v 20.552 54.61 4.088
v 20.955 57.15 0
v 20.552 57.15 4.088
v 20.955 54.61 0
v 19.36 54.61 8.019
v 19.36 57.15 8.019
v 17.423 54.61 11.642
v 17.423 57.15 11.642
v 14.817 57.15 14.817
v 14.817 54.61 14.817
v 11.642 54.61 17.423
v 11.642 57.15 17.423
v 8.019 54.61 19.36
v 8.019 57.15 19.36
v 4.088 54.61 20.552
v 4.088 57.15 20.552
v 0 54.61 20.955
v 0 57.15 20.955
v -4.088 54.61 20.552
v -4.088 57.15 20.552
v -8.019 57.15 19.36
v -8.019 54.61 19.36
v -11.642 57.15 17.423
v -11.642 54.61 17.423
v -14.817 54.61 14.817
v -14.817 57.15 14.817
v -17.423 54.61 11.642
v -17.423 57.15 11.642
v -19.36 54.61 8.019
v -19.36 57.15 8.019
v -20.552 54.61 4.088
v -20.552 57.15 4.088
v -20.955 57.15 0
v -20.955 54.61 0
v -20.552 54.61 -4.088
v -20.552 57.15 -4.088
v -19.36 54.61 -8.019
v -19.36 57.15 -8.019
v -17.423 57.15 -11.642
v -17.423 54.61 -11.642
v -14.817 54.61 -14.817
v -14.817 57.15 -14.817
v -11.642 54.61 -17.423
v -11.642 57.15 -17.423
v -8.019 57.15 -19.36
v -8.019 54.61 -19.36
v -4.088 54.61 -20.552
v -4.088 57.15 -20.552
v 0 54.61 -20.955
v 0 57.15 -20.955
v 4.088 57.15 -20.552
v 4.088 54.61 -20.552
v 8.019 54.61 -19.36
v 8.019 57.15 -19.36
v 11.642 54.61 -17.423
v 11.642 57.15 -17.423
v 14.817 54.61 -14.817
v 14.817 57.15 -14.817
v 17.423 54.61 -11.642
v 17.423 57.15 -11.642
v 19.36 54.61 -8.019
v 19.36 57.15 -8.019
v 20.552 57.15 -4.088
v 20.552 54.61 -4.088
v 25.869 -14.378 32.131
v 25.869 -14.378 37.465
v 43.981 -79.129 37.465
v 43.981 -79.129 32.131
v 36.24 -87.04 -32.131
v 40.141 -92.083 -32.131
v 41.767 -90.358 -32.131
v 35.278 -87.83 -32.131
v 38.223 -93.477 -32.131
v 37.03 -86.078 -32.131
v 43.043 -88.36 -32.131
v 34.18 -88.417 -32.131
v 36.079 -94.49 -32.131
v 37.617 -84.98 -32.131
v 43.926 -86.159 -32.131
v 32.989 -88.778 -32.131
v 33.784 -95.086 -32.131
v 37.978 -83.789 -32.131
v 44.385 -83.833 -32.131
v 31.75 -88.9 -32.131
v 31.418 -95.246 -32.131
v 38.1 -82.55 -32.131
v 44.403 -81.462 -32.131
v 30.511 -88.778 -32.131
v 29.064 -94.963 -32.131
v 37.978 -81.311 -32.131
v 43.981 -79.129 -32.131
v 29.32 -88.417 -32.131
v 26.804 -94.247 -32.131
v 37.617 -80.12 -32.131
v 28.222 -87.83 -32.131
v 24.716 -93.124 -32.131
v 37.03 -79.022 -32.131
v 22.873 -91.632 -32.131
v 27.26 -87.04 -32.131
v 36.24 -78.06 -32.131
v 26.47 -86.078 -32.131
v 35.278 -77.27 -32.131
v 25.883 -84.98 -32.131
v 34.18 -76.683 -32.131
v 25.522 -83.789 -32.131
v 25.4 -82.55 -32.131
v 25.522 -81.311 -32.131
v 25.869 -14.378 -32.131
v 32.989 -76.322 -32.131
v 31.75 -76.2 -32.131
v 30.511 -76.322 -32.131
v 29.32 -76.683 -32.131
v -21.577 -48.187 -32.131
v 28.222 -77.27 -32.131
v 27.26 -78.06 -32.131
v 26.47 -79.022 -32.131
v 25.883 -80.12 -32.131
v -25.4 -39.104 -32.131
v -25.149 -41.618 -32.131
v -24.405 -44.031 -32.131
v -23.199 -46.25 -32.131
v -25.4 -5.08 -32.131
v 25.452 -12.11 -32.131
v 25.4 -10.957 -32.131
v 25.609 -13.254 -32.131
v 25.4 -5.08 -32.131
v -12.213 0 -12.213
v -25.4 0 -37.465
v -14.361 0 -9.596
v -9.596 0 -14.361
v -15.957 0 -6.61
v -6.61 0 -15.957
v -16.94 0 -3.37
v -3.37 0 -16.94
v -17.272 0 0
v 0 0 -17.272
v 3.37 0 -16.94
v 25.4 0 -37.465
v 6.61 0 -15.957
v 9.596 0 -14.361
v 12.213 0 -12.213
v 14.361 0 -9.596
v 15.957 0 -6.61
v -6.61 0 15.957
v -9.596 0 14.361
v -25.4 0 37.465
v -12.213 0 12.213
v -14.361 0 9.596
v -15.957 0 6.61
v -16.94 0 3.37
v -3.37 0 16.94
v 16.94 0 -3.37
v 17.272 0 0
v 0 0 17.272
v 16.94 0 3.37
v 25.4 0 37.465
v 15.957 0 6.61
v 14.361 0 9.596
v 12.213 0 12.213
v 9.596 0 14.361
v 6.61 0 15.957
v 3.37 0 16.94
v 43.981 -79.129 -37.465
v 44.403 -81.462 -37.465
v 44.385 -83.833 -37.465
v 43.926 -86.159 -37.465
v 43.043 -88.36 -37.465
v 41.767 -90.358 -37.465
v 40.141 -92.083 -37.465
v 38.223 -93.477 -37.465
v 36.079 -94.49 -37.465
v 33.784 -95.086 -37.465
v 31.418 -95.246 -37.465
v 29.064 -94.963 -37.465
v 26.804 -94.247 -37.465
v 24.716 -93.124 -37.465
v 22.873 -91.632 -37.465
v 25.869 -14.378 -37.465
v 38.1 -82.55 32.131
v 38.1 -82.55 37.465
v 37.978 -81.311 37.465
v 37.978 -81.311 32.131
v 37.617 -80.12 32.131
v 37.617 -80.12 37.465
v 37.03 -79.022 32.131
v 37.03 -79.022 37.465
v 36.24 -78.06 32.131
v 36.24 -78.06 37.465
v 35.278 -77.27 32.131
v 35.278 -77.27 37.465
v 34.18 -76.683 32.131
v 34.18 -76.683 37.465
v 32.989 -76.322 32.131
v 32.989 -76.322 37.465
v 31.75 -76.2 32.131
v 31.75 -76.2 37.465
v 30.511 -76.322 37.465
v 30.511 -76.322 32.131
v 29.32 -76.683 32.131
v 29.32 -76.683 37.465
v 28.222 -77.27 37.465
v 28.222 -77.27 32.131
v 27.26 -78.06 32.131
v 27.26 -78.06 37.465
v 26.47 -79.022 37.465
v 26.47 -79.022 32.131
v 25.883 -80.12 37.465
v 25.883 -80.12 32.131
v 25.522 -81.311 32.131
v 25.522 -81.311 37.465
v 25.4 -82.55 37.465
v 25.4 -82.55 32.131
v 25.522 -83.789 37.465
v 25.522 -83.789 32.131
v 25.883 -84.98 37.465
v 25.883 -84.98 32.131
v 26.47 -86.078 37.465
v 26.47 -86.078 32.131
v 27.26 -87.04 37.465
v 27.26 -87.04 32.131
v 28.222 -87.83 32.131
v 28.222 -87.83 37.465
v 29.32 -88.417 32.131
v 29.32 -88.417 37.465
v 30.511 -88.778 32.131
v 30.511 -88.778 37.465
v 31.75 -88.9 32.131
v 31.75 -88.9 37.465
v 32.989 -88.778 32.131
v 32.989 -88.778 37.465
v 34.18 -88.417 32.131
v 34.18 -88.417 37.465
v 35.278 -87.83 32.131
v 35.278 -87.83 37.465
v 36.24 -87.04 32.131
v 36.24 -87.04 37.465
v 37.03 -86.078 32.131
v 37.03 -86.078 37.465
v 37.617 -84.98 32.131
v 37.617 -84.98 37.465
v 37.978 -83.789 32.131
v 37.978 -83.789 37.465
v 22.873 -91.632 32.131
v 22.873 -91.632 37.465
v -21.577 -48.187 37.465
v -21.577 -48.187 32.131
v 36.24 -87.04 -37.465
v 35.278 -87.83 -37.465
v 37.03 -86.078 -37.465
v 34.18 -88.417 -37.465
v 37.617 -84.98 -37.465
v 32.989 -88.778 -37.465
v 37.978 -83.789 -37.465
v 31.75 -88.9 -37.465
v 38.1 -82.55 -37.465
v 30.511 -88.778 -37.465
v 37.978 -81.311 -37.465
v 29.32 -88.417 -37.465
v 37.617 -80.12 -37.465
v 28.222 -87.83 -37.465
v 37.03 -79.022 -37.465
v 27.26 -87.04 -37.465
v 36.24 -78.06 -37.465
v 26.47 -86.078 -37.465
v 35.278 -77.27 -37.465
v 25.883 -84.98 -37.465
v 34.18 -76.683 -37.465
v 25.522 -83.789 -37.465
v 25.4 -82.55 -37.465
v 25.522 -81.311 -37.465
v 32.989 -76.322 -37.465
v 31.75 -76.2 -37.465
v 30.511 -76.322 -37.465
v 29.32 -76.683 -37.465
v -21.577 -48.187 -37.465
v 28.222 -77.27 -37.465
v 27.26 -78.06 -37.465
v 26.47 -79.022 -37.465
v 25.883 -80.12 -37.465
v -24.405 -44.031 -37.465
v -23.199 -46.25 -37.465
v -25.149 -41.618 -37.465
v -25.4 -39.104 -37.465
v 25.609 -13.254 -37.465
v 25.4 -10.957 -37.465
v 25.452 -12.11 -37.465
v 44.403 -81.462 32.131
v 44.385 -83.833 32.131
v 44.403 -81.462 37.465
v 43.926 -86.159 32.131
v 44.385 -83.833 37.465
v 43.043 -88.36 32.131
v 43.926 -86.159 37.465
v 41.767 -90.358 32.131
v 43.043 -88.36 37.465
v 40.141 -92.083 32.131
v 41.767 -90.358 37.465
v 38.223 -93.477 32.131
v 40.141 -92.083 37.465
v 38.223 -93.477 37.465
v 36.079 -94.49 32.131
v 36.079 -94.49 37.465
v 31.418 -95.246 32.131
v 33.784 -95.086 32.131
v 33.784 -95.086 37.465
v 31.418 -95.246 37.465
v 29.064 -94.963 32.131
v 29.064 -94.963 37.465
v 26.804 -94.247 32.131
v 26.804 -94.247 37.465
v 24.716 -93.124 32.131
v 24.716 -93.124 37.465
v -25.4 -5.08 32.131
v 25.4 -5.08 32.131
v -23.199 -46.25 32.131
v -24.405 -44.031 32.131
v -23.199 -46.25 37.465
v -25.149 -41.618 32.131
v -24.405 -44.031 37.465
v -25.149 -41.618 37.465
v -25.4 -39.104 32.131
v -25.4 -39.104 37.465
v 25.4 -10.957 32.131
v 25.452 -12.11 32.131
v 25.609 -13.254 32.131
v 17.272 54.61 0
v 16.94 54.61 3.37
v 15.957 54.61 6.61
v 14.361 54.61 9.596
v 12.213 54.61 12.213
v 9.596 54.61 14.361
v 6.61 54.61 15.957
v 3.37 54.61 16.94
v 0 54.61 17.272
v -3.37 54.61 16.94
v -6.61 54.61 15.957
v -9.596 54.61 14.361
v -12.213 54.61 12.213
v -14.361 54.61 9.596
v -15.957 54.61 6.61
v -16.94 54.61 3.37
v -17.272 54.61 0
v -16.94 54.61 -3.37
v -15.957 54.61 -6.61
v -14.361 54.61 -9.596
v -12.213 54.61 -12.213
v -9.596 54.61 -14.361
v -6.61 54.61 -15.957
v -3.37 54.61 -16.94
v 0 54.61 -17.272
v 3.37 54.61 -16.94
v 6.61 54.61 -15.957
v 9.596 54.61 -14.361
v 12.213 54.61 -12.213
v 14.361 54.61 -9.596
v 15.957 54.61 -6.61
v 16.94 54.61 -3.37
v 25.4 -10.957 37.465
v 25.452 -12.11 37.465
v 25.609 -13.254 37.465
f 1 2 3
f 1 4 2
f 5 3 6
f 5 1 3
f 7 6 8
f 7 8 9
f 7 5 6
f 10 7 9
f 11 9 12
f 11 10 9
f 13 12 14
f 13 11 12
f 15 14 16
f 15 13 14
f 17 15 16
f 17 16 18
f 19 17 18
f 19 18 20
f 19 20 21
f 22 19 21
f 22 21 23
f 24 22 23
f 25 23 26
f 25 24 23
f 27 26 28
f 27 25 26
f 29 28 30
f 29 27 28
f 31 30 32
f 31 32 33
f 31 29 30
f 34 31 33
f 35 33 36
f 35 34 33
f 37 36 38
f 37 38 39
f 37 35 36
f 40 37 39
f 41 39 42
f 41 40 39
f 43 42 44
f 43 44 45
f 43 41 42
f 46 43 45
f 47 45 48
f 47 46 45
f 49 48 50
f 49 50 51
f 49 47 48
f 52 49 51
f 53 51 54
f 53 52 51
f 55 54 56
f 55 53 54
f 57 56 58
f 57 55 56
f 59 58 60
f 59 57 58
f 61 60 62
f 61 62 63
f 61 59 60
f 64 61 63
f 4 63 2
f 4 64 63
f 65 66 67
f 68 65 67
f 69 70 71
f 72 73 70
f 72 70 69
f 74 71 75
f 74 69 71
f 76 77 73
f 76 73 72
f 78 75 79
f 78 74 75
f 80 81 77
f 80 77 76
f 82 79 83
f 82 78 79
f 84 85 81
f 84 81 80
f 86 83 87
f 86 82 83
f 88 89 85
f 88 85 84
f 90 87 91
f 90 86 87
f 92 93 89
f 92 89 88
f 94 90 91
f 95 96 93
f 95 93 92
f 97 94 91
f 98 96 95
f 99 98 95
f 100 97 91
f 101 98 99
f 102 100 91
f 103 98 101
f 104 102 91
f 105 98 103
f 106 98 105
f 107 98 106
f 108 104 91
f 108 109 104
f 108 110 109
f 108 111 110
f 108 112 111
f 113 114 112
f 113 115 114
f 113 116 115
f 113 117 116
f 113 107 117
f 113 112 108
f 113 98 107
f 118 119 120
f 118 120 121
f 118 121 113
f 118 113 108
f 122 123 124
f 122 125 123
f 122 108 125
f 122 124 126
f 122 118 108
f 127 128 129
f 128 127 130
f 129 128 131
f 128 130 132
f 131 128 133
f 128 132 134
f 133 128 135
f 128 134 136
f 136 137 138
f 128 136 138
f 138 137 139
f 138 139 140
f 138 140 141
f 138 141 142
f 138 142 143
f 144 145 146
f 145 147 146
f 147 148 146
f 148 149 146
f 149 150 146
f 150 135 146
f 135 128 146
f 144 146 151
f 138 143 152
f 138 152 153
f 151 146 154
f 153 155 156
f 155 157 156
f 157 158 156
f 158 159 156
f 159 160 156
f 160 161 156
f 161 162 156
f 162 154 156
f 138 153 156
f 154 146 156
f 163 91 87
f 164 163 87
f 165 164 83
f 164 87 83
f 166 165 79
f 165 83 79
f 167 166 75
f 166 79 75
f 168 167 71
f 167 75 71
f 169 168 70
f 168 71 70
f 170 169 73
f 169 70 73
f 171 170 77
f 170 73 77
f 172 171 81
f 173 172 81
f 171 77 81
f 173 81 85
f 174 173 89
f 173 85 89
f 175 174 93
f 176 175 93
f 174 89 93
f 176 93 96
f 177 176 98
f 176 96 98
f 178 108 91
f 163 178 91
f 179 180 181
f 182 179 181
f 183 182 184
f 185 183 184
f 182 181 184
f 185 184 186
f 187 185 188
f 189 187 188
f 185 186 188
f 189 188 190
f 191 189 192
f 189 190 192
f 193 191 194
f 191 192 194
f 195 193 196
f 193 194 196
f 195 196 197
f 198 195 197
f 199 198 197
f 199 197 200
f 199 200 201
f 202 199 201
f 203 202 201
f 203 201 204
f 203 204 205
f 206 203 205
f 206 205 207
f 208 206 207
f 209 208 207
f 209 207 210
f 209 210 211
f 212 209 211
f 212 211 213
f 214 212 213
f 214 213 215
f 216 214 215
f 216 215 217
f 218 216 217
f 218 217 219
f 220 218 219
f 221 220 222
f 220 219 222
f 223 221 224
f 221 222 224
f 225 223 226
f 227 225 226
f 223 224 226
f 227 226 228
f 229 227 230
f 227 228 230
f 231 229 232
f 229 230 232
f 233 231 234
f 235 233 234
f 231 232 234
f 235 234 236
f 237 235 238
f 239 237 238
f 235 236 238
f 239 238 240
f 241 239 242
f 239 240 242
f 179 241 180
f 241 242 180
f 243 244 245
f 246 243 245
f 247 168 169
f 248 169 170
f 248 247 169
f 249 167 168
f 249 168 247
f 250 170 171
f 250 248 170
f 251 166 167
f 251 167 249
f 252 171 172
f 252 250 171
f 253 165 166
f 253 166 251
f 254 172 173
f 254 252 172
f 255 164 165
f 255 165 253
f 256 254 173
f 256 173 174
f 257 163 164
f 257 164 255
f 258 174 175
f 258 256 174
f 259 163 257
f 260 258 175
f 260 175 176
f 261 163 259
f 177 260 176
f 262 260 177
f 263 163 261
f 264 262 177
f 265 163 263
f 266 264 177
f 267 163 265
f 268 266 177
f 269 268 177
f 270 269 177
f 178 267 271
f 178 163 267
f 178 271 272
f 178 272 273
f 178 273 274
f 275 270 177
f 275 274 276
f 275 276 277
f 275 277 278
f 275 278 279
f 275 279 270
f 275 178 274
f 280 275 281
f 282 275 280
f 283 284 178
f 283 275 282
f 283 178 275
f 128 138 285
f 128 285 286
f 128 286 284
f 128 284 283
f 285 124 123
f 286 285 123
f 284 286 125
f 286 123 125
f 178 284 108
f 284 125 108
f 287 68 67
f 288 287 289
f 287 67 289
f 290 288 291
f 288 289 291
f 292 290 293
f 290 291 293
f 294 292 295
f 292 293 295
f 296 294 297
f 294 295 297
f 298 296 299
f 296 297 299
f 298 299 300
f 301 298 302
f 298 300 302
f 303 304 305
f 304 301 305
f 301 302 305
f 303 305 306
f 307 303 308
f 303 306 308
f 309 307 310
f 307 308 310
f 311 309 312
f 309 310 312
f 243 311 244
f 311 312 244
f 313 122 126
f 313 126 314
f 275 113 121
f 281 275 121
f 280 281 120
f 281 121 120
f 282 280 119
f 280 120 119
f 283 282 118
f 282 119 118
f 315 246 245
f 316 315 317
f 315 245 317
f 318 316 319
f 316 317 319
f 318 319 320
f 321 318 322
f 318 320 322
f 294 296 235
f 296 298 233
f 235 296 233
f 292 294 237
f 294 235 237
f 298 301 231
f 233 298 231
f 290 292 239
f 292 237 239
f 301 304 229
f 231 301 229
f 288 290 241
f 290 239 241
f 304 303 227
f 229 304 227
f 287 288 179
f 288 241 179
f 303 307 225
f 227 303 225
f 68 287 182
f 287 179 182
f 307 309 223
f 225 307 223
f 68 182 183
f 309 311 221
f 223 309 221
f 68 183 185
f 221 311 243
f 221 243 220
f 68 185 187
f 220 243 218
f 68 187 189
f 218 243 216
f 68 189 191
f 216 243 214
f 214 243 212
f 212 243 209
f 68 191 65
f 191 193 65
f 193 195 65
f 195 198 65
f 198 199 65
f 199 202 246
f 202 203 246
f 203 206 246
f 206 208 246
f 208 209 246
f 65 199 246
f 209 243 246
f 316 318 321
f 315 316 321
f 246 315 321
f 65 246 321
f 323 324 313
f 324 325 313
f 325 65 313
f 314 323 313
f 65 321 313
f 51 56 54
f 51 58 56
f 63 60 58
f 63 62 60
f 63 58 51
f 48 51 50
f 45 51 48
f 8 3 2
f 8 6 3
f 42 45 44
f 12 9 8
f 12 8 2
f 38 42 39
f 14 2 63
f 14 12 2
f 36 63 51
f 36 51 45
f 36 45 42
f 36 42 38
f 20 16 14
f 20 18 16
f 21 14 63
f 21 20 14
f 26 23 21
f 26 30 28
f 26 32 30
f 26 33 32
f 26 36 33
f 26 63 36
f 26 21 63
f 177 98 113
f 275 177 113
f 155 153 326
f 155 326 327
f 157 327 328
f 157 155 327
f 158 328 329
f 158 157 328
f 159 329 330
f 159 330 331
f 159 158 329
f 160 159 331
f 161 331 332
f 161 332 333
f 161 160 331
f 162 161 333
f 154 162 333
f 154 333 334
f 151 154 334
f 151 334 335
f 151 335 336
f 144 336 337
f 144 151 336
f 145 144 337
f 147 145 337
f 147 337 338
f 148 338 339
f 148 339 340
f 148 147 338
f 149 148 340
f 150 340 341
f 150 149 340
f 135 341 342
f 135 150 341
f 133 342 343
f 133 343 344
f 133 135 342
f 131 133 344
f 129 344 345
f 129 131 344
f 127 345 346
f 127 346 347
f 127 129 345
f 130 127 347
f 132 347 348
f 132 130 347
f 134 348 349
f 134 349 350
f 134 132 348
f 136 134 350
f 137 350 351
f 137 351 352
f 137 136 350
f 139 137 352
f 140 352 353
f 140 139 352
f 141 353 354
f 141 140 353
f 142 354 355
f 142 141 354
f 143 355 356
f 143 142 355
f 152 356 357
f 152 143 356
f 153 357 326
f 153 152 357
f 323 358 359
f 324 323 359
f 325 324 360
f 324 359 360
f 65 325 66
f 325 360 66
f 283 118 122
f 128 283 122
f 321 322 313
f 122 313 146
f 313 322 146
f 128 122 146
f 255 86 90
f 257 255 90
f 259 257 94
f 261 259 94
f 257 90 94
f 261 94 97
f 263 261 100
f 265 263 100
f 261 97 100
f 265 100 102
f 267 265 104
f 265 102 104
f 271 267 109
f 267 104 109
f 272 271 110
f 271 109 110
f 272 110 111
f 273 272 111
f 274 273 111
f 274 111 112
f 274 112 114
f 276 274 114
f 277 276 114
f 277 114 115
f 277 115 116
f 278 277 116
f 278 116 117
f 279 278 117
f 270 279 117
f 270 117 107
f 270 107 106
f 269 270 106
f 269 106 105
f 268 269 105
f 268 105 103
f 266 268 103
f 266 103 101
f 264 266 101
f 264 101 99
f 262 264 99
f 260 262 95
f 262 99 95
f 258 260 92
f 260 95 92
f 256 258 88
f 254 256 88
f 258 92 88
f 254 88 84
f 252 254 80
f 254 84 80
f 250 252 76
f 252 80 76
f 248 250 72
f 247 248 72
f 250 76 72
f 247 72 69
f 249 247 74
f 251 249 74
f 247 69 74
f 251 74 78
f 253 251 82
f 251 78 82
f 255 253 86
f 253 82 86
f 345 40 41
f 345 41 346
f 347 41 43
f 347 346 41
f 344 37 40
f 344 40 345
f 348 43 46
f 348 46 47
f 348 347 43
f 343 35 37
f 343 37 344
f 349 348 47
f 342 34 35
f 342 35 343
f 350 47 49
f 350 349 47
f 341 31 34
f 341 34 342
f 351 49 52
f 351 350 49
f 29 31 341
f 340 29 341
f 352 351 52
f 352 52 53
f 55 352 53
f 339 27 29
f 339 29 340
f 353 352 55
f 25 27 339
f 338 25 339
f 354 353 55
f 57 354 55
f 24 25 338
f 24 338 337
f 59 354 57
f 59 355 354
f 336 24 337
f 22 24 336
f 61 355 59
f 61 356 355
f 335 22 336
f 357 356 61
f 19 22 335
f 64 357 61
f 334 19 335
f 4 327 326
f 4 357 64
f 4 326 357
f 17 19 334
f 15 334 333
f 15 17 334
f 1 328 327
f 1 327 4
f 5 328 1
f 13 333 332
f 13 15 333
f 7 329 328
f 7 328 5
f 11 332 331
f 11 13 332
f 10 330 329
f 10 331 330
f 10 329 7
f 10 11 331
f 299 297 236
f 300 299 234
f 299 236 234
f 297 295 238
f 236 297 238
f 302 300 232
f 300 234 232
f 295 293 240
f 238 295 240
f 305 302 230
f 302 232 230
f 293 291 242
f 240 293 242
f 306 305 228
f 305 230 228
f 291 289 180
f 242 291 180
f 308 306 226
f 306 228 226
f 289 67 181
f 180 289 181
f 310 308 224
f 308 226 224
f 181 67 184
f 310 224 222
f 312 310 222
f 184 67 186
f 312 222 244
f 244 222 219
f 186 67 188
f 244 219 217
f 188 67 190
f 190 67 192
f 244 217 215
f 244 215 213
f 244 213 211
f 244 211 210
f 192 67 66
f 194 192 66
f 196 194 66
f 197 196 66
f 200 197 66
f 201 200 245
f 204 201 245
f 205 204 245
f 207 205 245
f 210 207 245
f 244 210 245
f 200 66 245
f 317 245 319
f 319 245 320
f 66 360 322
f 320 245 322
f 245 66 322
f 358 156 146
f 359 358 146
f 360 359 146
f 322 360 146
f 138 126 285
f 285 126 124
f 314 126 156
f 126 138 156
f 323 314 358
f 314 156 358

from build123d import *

# Parameters (mm, degrees)
BOSS_EXTRUDE1_DEPTH      = 37.465
BOSS_EXTRUDE1_DEPTH_BACK = 37.465
SKETCH3_W                = 64.262
SKETCH3_H                = 110.648250087
CUT_EXTRUDE1_DEPTH       = 55.118
CUT_EXTRUDE1_DEPTH_BACK  = 109.601
SKETCH4_R                = 6.35
CUT_EXTRUDE2_DEPTH       = 109.601


with BuildPart() as part:
    # Sketch1 → Revolve1 (revolve)
    with BuildSketch(Plane.XY):
        Polygon((0, 57.15), (20.955, 57.15), (20.955, 54.61), (17.272, 54.61), (17.272, 0), (0, 0), align=None)
    revolve(axis=Axis((0, 38.1873125, 0), (0, -1, 0)))

    # Sketch2 → Boss-Extrude1 (add, two sides)
    with BuildSketch(Plane.XY) as boss_extrude1_sk:
        with BuildLine():
            Line((-25.4, 0), (25.4, 0))
            Line((25.4, 0), (25.4, -10.957312238))
            ThreePointArc((25.4, -10.957312238), (25.517902954, -12.683821415), (25.869422667, -14.378273814))
            Line((25.869422667, -14.378273814), (43.980577333, -79.129038424))
            ThreePointArc((43.980577333, -79.129038424), (38.222573525, -93.476838151), (22.872930676, -91.632270653))
            Line((22.872930676, -91.632270653), (-21.577069324, -48.186556851))
            ThreePointArc((-21.577069324, -48.186556851), (-24.405314614, -44.031314693), (-25.4, -39.104286198))
            Line((-25.4, -39.104286198), (-25.4, 0))
        make_face()
    extrude(amount=BOSS_EXTRUDE1_DEPTH)
    extrude(boss_extrude1_sk.sketch, amount=-BOSS_EXTRUDE1_DEPTH_BACK)

    # Sketch3 → Cut-Extrude1 (cut, two sides)
    with BuildSketch(Plane.ZY.offset(25.4)) as cut_extrude1_sk:
        with Locations((0, -60.404125044)):
            Rectangle(SKETCH3_W, SKETCH3_H)
    extrude(amount=CUT_EXTRUDE1_DEPTH, mode=Mode.SUBTRACT)
    extrude(cut_extrude1_sk.sketch, amount=-CUT_EXTRUDE1_DEPTH_BACK, mode=Mode.SUBTRACT)

    # Sketch4 → Cut-Extrude2 (cut)
    with BuildSketch(Plane.XY.offset(37.465)):
        with Locations((31.75, -82.55)):
            Circle(SKETCH4_R)
    extrude(amount=-CUT_EXTRUDE2_DEPTH, mode=Mode.SUBTRACT)


solid = part.part
